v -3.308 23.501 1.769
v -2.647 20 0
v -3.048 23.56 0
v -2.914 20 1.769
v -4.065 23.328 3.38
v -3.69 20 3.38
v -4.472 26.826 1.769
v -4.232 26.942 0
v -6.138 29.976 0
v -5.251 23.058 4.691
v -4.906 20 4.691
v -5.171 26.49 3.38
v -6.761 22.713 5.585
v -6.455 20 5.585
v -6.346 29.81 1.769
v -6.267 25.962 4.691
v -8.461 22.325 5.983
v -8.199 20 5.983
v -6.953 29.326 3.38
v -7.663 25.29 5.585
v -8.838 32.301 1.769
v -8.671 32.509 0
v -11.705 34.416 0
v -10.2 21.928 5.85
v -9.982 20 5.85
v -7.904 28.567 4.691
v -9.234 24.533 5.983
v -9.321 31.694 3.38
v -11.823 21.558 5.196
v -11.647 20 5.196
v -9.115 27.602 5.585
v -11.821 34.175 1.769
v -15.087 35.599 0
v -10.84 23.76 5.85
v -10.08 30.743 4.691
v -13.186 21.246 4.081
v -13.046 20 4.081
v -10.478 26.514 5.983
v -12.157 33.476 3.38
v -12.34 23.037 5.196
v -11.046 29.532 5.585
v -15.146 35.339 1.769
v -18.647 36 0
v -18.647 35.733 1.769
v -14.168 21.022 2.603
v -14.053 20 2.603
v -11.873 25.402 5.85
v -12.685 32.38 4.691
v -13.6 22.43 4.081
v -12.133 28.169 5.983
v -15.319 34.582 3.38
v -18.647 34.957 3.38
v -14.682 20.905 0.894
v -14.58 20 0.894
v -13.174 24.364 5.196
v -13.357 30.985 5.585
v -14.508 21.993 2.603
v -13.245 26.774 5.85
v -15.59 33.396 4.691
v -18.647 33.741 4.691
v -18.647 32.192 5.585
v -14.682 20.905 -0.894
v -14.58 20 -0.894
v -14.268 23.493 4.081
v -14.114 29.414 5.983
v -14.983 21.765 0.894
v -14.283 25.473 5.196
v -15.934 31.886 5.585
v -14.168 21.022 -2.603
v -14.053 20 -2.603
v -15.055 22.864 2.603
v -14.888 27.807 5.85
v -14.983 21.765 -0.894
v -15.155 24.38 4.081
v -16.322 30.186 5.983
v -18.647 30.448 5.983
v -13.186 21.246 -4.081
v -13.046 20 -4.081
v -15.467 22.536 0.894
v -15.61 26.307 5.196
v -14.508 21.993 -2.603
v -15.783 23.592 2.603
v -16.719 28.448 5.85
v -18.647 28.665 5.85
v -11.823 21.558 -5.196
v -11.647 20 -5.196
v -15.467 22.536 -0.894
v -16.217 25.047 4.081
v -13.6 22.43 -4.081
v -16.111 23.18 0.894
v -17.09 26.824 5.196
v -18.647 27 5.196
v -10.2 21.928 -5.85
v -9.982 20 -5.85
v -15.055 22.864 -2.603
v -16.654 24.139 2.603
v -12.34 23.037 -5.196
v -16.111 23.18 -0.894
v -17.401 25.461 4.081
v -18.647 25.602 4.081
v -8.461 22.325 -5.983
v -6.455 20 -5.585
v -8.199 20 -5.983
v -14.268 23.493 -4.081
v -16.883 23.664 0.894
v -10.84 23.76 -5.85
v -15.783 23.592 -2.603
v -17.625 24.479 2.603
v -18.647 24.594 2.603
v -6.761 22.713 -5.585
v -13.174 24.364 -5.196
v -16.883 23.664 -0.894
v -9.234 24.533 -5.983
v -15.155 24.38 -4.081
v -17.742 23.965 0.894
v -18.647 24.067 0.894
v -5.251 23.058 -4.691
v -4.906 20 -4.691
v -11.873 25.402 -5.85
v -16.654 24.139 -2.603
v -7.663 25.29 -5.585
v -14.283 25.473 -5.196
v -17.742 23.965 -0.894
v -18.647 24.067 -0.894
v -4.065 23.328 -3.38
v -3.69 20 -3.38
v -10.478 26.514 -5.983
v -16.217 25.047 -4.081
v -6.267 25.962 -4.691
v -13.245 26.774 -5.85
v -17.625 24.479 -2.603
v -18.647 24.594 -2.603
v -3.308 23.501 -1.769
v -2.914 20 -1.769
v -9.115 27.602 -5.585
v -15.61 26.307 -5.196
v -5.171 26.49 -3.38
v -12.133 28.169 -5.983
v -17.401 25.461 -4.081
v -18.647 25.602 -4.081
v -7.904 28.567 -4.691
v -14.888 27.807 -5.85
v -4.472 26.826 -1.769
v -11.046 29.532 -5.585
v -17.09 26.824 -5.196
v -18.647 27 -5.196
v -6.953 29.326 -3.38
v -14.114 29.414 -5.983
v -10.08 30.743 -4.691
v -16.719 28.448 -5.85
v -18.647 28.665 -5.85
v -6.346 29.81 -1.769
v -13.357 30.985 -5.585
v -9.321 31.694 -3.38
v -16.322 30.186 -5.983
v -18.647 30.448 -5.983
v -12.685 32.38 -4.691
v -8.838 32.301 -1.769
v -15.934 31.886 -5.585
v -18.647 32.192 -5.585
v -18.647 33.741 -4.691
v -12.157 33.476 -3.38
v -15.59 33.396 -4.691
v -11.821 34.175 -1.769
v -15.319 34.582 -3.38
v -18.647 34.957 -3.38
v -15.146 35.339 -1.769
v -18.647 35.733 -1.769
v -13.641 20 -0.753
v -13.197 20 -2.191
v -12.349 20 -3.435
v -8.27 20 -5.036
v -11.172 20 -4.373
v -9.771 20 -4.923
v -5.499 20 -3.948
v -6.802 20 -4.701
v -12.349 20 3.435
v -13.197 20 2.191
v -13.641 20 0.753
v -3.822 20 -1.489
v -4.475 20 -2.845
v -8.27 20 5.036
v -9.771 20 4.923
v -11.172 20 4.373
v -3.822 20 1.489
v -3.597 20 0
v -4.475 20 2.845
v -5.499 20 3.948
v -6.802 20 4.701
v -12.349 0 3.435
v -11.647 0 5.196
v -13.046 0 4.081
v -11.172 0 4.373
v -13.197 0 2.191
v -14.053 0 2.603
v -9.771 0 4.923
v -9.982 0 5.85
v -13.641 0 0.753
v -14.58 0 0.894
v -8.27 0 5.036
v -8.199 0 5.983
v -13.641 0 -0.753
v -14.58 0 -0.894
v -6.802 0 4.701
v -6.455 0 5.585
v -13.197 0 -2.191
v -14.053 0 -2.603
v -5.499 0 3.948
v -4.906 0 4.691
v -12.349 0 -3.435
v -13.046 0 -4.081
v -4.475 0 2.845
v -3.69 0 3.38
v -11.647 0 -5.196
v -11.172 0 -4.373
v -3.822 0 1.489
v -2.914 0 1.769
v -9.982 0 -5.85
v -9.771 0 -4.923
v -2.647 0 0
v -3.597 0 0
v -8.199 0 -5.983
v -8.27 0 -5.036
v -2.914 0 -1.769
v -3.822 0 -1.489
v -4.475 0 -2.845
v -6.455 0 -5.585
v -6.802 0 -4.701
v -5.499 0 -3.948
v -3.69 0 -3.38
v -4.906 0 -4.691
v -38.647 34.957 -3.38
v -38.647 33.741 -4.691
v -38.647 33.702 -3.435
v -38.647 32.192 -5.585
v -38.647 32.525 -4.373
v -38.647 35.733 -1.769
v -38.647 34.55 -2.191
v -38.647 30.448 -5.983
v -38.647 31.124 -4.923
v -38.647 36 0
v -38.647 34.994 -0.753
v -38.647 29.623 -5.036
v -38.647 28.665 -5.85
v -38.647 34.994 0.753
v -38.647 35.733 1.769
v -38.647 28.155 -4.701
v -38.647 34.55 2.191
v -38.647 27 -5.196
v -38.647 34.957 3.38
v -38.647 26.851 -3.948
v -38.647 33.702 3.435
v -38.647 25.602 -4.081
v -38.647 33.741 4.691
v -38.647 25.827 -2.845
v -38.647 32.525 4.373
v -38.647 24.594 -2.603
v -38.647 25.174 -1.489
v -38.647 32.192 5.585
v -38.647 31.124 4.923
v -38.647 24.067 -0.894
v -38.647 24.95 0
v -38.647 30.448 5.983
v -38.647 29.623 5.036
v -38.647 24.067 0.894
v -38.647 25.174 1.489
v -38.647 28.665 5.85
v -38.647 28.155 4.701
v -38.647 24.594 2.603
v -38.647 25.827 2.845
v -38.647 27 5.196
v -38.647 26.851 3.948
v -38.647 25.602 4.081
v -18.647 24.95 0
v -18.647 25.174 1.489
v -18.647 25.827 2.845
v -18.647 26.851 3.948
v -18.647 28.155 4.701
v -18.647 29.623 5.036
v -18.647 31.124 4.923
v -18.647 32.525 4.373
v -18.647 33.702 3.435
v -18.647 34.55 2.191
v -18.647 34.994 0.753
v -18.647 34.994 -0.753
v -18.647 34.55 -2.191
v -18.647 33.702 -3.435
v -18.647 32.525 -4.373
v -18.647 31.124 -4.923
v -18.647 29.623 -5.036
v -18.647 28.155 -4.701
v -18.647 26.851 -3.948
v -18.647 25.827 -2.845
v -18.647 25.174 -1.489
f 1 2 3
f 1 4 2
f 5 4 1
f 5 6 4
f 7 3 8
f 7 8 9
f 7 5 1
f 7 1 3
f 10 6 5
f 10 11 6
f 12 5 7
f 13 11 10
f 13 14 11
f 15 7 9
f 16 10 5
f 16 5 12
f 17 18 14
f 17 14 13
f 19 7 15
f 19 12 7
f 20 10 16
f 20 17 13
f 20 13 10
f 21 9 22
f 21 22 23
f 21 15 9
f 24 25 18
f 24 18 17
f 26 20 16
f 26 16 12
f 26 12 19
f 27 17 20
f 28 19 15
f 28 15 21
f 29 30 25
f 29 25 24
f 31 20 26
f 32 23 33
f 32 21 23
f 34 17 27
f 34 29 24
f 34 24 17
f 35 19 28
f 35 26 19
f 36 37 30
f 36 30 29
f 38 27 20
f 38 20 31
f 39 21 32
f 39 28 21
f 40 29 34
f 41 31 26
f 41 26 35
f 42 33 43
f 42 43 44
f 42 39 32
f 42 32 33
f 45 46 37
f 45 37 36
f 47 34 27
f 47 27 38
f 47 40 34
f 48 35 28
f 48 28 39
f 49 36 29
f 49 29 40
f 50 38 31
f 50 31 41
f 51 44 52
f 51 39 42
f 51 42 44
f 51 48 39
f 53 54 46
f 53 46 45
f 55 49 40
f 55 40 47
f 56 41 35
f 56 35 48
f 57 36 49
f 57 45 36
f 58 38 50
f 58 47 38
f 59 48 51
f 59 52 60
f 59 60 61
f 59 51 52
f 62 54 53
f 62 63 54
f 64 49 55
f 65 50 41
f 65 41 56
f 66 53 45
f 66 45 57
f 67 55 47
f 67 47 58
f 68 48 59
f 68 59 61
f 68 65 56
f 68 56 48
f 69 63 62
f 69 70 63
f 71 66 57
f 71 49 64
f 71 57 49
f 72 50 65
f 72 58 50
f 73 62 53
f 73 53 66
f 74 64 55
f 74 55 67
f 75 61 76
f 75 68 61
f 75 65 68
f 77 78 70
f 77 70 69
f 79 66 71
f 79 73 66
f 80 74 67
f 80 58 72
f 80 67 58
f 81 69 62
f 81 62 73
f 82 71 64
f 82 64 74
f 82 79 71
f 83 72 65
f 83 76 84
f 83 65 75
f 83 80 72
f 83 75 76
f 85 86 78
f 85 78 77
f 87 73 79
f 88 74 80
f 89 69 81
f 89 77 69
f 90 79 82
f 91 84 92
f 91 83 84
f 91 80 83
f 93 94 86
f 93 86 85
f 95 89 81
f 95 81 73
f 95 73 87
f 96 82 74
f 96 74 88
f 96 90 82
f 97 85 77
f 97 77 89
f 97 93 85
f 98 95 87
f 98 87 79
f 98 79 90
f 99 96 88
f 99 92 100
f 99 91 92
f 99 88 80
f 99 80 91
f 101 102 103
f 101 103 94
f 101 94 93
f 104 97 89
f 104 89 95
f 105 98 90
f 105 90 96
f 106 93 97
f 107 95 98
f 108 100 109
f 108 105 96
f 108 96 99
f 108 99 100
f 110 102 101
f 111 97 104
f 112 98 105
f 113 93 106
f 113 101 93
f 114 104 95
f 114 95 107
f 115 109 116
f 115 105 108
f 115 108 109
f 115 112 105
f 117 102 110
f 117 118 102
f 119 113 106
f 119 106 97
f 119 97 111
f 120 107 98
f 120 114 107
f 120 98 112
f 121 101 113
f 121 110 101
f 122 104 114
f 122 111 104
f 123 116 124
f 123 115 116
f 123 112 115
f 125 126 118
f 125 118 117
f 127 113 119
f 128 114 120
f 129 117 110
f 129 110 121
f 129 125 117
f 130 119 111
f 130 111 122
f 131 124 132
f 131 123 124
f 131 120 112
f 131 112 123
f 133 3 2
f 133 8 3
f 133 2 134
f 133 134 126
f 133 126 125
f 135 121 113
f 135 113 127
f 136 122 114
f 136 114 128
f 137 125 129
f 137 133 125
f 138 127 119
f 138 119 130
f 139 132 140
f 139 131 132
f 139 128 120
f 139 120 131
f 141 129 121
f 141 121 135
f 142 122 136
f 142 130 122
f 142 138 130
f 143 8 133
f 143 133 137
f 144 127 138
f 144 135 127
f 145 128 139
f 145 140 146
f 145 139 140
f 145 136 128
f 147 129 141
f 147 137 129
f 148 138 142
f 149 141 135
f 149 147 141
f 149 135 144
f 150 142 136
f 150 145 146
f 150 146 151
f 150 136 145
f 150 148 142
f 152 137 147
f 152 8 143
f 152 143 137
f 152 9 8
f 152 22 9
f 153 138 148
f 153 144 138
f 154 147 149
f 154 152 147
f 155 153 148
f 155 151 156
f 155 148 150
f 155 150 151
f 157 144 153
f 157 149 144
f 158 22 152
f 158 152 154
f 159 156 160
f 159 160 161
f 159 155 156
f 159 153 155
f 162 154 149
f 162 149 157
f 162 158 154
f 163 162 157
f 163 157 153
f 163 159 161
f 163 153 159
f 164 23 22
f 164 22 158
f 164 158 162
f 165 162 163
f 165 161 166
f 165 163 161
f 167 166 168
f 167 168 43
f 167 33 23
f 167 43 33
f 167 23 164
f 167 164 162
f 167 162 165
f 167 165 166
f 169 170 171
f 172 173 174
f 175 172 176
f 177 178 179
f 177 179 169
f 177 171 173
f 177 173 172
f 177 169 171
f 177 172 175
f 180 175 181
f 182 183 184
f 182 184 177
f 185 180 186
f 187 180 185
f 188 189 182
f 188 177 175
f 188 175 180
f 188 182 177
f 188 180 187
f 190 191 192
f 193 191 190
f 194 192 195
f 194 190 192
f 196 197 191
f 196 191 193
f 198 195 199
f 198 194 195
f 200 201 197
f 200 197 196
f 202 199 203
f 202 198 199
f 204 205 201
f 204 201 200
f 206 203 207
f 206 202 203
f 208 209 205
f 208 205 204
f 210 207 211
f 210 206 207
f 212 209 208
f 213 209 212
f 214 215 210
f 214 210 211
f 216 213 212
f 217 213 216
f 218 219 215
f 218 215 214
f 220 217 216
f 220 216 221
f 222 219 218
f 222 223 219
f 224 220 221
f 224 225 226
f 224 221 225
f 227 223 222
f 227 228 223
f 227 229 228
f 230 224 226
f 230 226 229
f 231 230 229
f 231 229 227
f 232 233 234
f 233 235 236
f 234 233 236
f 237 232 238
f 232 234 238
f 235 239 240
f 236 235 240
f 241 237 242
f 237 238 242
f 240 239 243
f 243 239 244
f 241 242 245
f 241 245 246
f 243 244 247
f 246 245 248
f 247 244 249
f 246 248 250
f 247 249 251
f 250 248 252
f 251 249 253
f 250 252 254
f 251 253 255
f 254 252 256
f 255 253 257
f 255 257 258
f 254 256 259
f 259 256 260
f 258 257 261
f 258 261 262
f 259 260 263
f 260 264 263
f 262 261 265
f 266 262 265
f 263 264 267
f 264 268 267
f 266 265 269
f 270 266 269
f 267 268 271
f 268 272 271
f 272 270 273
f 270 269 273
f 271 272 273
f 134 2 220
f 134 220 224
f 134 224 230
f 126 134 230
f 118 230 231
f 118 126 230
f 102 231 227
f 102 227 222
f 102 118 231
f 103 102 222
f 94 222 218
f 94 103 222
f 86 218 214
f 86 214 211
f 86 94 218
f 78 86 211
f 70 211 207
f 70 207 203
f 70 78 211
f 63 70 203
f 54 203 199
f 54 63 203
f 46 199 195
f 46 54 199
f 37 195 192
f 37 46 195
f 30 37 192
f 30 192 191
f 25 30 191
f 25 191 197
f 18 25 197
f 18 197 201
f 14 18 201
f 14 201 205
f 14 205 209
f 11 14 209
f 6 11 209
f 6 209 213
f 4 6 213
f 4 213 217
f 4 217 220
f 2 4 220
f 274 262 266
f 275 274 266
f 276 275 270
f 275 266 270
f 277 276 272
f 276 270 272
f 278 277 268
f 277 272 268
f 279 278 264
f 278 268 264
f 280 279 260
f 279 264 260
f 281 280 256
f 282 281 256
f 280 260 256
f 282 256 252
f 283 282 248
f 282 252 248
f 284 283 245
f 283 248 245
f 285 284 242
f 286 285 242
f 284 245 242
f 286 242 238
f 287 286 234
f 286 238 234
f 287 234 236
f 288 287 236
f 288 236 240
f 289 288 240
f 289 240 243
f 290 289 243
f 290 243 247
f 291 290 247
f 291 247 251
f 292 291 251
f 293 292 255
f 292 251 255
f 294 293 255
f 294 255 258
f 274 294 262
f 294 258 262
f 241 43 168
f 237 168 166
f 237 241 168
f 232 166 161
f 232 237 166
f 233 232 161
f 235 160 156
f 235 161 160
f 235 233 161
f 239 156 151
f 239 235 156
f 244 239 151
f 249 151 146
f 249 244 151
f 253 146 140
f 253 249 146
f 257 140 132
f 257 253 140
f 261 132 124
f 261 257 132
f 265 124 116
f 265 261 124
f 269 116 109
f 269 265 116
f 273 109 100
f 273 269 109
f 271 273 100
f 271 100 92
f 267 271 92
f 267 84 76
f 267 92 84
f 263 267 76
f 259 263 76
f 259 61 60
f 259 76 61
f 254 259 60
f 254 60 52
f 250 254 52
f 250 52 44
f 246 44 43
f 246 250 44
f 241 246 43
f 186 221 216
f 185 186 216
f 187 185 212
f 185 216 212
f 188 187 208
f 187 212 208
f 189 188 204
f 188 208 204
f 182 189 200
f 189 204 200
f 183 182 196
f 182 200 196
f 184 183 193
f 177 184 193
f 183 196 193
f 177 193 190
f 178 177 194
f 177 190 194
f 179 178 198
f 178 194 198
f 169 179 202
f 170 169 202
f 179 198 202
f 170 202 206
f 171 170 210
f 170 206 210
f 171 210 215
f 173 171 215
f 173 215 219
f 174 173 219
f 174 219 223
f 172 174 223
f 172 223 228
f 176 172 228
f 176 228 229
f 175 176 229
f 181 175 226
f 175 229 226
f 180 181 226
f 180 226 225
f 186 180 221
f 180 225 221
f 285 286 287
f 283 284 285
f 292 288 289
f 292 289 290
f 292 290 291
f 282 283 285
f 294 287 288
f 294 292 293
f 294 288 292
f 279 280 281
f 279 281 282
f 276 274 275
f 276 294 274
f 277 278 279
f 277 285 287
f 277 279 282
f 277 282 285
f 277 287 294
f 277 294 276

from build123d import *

# Parameters (mm, degrees)
F1_R     = 6
F4_R     = 5.05
F5_DEPTH = 20
F6_R     = 5.05
F7_DEPTH = 20


with BuildPart() as f3:
    # F3: sweep along a path in F0
    with BuildLine(Plane.XY) as f3_path:
        Line((-8.6471897678, 0), (-8.6471897678, 20))
        ThreePointArc((-8.6471897678, 20), (-11.5761219559, 27.0710678119), (-18.6471897678, 30))
        Line((-18.6471897678, 30), (-38.6471897678, 30))
    # F1 (on Front) → F3 (sweep)
    with BuildSketch(Plane.XZ):
        with Locations((-8.6471897678, 0)):
            Circle(F1_R)
    sweep(path=f3_path.line)

    # F4 (on face) → F5 (cut)
    with BuildSketch(Plane.XZ):
        with Locations((-8.6471897678, 0)):
            Circle(F4_R)
    extrude(amount=-F5_DEPTH, mode=Mode.SUBTRACT)

    # F6 (on face) → F7 (cut)
    with BuildSketch(Plane(origin=(-38.6471897678, 0, 0), x_dir=(0, -1, 0), z_dir=(-1, 0, 0))):
        with Locations((-30, 0)):
            Circle(F6_R)
    extrude(amount=-F7_DEPTH, mode=Mode.SUBTRACT)


solid = f3.part
